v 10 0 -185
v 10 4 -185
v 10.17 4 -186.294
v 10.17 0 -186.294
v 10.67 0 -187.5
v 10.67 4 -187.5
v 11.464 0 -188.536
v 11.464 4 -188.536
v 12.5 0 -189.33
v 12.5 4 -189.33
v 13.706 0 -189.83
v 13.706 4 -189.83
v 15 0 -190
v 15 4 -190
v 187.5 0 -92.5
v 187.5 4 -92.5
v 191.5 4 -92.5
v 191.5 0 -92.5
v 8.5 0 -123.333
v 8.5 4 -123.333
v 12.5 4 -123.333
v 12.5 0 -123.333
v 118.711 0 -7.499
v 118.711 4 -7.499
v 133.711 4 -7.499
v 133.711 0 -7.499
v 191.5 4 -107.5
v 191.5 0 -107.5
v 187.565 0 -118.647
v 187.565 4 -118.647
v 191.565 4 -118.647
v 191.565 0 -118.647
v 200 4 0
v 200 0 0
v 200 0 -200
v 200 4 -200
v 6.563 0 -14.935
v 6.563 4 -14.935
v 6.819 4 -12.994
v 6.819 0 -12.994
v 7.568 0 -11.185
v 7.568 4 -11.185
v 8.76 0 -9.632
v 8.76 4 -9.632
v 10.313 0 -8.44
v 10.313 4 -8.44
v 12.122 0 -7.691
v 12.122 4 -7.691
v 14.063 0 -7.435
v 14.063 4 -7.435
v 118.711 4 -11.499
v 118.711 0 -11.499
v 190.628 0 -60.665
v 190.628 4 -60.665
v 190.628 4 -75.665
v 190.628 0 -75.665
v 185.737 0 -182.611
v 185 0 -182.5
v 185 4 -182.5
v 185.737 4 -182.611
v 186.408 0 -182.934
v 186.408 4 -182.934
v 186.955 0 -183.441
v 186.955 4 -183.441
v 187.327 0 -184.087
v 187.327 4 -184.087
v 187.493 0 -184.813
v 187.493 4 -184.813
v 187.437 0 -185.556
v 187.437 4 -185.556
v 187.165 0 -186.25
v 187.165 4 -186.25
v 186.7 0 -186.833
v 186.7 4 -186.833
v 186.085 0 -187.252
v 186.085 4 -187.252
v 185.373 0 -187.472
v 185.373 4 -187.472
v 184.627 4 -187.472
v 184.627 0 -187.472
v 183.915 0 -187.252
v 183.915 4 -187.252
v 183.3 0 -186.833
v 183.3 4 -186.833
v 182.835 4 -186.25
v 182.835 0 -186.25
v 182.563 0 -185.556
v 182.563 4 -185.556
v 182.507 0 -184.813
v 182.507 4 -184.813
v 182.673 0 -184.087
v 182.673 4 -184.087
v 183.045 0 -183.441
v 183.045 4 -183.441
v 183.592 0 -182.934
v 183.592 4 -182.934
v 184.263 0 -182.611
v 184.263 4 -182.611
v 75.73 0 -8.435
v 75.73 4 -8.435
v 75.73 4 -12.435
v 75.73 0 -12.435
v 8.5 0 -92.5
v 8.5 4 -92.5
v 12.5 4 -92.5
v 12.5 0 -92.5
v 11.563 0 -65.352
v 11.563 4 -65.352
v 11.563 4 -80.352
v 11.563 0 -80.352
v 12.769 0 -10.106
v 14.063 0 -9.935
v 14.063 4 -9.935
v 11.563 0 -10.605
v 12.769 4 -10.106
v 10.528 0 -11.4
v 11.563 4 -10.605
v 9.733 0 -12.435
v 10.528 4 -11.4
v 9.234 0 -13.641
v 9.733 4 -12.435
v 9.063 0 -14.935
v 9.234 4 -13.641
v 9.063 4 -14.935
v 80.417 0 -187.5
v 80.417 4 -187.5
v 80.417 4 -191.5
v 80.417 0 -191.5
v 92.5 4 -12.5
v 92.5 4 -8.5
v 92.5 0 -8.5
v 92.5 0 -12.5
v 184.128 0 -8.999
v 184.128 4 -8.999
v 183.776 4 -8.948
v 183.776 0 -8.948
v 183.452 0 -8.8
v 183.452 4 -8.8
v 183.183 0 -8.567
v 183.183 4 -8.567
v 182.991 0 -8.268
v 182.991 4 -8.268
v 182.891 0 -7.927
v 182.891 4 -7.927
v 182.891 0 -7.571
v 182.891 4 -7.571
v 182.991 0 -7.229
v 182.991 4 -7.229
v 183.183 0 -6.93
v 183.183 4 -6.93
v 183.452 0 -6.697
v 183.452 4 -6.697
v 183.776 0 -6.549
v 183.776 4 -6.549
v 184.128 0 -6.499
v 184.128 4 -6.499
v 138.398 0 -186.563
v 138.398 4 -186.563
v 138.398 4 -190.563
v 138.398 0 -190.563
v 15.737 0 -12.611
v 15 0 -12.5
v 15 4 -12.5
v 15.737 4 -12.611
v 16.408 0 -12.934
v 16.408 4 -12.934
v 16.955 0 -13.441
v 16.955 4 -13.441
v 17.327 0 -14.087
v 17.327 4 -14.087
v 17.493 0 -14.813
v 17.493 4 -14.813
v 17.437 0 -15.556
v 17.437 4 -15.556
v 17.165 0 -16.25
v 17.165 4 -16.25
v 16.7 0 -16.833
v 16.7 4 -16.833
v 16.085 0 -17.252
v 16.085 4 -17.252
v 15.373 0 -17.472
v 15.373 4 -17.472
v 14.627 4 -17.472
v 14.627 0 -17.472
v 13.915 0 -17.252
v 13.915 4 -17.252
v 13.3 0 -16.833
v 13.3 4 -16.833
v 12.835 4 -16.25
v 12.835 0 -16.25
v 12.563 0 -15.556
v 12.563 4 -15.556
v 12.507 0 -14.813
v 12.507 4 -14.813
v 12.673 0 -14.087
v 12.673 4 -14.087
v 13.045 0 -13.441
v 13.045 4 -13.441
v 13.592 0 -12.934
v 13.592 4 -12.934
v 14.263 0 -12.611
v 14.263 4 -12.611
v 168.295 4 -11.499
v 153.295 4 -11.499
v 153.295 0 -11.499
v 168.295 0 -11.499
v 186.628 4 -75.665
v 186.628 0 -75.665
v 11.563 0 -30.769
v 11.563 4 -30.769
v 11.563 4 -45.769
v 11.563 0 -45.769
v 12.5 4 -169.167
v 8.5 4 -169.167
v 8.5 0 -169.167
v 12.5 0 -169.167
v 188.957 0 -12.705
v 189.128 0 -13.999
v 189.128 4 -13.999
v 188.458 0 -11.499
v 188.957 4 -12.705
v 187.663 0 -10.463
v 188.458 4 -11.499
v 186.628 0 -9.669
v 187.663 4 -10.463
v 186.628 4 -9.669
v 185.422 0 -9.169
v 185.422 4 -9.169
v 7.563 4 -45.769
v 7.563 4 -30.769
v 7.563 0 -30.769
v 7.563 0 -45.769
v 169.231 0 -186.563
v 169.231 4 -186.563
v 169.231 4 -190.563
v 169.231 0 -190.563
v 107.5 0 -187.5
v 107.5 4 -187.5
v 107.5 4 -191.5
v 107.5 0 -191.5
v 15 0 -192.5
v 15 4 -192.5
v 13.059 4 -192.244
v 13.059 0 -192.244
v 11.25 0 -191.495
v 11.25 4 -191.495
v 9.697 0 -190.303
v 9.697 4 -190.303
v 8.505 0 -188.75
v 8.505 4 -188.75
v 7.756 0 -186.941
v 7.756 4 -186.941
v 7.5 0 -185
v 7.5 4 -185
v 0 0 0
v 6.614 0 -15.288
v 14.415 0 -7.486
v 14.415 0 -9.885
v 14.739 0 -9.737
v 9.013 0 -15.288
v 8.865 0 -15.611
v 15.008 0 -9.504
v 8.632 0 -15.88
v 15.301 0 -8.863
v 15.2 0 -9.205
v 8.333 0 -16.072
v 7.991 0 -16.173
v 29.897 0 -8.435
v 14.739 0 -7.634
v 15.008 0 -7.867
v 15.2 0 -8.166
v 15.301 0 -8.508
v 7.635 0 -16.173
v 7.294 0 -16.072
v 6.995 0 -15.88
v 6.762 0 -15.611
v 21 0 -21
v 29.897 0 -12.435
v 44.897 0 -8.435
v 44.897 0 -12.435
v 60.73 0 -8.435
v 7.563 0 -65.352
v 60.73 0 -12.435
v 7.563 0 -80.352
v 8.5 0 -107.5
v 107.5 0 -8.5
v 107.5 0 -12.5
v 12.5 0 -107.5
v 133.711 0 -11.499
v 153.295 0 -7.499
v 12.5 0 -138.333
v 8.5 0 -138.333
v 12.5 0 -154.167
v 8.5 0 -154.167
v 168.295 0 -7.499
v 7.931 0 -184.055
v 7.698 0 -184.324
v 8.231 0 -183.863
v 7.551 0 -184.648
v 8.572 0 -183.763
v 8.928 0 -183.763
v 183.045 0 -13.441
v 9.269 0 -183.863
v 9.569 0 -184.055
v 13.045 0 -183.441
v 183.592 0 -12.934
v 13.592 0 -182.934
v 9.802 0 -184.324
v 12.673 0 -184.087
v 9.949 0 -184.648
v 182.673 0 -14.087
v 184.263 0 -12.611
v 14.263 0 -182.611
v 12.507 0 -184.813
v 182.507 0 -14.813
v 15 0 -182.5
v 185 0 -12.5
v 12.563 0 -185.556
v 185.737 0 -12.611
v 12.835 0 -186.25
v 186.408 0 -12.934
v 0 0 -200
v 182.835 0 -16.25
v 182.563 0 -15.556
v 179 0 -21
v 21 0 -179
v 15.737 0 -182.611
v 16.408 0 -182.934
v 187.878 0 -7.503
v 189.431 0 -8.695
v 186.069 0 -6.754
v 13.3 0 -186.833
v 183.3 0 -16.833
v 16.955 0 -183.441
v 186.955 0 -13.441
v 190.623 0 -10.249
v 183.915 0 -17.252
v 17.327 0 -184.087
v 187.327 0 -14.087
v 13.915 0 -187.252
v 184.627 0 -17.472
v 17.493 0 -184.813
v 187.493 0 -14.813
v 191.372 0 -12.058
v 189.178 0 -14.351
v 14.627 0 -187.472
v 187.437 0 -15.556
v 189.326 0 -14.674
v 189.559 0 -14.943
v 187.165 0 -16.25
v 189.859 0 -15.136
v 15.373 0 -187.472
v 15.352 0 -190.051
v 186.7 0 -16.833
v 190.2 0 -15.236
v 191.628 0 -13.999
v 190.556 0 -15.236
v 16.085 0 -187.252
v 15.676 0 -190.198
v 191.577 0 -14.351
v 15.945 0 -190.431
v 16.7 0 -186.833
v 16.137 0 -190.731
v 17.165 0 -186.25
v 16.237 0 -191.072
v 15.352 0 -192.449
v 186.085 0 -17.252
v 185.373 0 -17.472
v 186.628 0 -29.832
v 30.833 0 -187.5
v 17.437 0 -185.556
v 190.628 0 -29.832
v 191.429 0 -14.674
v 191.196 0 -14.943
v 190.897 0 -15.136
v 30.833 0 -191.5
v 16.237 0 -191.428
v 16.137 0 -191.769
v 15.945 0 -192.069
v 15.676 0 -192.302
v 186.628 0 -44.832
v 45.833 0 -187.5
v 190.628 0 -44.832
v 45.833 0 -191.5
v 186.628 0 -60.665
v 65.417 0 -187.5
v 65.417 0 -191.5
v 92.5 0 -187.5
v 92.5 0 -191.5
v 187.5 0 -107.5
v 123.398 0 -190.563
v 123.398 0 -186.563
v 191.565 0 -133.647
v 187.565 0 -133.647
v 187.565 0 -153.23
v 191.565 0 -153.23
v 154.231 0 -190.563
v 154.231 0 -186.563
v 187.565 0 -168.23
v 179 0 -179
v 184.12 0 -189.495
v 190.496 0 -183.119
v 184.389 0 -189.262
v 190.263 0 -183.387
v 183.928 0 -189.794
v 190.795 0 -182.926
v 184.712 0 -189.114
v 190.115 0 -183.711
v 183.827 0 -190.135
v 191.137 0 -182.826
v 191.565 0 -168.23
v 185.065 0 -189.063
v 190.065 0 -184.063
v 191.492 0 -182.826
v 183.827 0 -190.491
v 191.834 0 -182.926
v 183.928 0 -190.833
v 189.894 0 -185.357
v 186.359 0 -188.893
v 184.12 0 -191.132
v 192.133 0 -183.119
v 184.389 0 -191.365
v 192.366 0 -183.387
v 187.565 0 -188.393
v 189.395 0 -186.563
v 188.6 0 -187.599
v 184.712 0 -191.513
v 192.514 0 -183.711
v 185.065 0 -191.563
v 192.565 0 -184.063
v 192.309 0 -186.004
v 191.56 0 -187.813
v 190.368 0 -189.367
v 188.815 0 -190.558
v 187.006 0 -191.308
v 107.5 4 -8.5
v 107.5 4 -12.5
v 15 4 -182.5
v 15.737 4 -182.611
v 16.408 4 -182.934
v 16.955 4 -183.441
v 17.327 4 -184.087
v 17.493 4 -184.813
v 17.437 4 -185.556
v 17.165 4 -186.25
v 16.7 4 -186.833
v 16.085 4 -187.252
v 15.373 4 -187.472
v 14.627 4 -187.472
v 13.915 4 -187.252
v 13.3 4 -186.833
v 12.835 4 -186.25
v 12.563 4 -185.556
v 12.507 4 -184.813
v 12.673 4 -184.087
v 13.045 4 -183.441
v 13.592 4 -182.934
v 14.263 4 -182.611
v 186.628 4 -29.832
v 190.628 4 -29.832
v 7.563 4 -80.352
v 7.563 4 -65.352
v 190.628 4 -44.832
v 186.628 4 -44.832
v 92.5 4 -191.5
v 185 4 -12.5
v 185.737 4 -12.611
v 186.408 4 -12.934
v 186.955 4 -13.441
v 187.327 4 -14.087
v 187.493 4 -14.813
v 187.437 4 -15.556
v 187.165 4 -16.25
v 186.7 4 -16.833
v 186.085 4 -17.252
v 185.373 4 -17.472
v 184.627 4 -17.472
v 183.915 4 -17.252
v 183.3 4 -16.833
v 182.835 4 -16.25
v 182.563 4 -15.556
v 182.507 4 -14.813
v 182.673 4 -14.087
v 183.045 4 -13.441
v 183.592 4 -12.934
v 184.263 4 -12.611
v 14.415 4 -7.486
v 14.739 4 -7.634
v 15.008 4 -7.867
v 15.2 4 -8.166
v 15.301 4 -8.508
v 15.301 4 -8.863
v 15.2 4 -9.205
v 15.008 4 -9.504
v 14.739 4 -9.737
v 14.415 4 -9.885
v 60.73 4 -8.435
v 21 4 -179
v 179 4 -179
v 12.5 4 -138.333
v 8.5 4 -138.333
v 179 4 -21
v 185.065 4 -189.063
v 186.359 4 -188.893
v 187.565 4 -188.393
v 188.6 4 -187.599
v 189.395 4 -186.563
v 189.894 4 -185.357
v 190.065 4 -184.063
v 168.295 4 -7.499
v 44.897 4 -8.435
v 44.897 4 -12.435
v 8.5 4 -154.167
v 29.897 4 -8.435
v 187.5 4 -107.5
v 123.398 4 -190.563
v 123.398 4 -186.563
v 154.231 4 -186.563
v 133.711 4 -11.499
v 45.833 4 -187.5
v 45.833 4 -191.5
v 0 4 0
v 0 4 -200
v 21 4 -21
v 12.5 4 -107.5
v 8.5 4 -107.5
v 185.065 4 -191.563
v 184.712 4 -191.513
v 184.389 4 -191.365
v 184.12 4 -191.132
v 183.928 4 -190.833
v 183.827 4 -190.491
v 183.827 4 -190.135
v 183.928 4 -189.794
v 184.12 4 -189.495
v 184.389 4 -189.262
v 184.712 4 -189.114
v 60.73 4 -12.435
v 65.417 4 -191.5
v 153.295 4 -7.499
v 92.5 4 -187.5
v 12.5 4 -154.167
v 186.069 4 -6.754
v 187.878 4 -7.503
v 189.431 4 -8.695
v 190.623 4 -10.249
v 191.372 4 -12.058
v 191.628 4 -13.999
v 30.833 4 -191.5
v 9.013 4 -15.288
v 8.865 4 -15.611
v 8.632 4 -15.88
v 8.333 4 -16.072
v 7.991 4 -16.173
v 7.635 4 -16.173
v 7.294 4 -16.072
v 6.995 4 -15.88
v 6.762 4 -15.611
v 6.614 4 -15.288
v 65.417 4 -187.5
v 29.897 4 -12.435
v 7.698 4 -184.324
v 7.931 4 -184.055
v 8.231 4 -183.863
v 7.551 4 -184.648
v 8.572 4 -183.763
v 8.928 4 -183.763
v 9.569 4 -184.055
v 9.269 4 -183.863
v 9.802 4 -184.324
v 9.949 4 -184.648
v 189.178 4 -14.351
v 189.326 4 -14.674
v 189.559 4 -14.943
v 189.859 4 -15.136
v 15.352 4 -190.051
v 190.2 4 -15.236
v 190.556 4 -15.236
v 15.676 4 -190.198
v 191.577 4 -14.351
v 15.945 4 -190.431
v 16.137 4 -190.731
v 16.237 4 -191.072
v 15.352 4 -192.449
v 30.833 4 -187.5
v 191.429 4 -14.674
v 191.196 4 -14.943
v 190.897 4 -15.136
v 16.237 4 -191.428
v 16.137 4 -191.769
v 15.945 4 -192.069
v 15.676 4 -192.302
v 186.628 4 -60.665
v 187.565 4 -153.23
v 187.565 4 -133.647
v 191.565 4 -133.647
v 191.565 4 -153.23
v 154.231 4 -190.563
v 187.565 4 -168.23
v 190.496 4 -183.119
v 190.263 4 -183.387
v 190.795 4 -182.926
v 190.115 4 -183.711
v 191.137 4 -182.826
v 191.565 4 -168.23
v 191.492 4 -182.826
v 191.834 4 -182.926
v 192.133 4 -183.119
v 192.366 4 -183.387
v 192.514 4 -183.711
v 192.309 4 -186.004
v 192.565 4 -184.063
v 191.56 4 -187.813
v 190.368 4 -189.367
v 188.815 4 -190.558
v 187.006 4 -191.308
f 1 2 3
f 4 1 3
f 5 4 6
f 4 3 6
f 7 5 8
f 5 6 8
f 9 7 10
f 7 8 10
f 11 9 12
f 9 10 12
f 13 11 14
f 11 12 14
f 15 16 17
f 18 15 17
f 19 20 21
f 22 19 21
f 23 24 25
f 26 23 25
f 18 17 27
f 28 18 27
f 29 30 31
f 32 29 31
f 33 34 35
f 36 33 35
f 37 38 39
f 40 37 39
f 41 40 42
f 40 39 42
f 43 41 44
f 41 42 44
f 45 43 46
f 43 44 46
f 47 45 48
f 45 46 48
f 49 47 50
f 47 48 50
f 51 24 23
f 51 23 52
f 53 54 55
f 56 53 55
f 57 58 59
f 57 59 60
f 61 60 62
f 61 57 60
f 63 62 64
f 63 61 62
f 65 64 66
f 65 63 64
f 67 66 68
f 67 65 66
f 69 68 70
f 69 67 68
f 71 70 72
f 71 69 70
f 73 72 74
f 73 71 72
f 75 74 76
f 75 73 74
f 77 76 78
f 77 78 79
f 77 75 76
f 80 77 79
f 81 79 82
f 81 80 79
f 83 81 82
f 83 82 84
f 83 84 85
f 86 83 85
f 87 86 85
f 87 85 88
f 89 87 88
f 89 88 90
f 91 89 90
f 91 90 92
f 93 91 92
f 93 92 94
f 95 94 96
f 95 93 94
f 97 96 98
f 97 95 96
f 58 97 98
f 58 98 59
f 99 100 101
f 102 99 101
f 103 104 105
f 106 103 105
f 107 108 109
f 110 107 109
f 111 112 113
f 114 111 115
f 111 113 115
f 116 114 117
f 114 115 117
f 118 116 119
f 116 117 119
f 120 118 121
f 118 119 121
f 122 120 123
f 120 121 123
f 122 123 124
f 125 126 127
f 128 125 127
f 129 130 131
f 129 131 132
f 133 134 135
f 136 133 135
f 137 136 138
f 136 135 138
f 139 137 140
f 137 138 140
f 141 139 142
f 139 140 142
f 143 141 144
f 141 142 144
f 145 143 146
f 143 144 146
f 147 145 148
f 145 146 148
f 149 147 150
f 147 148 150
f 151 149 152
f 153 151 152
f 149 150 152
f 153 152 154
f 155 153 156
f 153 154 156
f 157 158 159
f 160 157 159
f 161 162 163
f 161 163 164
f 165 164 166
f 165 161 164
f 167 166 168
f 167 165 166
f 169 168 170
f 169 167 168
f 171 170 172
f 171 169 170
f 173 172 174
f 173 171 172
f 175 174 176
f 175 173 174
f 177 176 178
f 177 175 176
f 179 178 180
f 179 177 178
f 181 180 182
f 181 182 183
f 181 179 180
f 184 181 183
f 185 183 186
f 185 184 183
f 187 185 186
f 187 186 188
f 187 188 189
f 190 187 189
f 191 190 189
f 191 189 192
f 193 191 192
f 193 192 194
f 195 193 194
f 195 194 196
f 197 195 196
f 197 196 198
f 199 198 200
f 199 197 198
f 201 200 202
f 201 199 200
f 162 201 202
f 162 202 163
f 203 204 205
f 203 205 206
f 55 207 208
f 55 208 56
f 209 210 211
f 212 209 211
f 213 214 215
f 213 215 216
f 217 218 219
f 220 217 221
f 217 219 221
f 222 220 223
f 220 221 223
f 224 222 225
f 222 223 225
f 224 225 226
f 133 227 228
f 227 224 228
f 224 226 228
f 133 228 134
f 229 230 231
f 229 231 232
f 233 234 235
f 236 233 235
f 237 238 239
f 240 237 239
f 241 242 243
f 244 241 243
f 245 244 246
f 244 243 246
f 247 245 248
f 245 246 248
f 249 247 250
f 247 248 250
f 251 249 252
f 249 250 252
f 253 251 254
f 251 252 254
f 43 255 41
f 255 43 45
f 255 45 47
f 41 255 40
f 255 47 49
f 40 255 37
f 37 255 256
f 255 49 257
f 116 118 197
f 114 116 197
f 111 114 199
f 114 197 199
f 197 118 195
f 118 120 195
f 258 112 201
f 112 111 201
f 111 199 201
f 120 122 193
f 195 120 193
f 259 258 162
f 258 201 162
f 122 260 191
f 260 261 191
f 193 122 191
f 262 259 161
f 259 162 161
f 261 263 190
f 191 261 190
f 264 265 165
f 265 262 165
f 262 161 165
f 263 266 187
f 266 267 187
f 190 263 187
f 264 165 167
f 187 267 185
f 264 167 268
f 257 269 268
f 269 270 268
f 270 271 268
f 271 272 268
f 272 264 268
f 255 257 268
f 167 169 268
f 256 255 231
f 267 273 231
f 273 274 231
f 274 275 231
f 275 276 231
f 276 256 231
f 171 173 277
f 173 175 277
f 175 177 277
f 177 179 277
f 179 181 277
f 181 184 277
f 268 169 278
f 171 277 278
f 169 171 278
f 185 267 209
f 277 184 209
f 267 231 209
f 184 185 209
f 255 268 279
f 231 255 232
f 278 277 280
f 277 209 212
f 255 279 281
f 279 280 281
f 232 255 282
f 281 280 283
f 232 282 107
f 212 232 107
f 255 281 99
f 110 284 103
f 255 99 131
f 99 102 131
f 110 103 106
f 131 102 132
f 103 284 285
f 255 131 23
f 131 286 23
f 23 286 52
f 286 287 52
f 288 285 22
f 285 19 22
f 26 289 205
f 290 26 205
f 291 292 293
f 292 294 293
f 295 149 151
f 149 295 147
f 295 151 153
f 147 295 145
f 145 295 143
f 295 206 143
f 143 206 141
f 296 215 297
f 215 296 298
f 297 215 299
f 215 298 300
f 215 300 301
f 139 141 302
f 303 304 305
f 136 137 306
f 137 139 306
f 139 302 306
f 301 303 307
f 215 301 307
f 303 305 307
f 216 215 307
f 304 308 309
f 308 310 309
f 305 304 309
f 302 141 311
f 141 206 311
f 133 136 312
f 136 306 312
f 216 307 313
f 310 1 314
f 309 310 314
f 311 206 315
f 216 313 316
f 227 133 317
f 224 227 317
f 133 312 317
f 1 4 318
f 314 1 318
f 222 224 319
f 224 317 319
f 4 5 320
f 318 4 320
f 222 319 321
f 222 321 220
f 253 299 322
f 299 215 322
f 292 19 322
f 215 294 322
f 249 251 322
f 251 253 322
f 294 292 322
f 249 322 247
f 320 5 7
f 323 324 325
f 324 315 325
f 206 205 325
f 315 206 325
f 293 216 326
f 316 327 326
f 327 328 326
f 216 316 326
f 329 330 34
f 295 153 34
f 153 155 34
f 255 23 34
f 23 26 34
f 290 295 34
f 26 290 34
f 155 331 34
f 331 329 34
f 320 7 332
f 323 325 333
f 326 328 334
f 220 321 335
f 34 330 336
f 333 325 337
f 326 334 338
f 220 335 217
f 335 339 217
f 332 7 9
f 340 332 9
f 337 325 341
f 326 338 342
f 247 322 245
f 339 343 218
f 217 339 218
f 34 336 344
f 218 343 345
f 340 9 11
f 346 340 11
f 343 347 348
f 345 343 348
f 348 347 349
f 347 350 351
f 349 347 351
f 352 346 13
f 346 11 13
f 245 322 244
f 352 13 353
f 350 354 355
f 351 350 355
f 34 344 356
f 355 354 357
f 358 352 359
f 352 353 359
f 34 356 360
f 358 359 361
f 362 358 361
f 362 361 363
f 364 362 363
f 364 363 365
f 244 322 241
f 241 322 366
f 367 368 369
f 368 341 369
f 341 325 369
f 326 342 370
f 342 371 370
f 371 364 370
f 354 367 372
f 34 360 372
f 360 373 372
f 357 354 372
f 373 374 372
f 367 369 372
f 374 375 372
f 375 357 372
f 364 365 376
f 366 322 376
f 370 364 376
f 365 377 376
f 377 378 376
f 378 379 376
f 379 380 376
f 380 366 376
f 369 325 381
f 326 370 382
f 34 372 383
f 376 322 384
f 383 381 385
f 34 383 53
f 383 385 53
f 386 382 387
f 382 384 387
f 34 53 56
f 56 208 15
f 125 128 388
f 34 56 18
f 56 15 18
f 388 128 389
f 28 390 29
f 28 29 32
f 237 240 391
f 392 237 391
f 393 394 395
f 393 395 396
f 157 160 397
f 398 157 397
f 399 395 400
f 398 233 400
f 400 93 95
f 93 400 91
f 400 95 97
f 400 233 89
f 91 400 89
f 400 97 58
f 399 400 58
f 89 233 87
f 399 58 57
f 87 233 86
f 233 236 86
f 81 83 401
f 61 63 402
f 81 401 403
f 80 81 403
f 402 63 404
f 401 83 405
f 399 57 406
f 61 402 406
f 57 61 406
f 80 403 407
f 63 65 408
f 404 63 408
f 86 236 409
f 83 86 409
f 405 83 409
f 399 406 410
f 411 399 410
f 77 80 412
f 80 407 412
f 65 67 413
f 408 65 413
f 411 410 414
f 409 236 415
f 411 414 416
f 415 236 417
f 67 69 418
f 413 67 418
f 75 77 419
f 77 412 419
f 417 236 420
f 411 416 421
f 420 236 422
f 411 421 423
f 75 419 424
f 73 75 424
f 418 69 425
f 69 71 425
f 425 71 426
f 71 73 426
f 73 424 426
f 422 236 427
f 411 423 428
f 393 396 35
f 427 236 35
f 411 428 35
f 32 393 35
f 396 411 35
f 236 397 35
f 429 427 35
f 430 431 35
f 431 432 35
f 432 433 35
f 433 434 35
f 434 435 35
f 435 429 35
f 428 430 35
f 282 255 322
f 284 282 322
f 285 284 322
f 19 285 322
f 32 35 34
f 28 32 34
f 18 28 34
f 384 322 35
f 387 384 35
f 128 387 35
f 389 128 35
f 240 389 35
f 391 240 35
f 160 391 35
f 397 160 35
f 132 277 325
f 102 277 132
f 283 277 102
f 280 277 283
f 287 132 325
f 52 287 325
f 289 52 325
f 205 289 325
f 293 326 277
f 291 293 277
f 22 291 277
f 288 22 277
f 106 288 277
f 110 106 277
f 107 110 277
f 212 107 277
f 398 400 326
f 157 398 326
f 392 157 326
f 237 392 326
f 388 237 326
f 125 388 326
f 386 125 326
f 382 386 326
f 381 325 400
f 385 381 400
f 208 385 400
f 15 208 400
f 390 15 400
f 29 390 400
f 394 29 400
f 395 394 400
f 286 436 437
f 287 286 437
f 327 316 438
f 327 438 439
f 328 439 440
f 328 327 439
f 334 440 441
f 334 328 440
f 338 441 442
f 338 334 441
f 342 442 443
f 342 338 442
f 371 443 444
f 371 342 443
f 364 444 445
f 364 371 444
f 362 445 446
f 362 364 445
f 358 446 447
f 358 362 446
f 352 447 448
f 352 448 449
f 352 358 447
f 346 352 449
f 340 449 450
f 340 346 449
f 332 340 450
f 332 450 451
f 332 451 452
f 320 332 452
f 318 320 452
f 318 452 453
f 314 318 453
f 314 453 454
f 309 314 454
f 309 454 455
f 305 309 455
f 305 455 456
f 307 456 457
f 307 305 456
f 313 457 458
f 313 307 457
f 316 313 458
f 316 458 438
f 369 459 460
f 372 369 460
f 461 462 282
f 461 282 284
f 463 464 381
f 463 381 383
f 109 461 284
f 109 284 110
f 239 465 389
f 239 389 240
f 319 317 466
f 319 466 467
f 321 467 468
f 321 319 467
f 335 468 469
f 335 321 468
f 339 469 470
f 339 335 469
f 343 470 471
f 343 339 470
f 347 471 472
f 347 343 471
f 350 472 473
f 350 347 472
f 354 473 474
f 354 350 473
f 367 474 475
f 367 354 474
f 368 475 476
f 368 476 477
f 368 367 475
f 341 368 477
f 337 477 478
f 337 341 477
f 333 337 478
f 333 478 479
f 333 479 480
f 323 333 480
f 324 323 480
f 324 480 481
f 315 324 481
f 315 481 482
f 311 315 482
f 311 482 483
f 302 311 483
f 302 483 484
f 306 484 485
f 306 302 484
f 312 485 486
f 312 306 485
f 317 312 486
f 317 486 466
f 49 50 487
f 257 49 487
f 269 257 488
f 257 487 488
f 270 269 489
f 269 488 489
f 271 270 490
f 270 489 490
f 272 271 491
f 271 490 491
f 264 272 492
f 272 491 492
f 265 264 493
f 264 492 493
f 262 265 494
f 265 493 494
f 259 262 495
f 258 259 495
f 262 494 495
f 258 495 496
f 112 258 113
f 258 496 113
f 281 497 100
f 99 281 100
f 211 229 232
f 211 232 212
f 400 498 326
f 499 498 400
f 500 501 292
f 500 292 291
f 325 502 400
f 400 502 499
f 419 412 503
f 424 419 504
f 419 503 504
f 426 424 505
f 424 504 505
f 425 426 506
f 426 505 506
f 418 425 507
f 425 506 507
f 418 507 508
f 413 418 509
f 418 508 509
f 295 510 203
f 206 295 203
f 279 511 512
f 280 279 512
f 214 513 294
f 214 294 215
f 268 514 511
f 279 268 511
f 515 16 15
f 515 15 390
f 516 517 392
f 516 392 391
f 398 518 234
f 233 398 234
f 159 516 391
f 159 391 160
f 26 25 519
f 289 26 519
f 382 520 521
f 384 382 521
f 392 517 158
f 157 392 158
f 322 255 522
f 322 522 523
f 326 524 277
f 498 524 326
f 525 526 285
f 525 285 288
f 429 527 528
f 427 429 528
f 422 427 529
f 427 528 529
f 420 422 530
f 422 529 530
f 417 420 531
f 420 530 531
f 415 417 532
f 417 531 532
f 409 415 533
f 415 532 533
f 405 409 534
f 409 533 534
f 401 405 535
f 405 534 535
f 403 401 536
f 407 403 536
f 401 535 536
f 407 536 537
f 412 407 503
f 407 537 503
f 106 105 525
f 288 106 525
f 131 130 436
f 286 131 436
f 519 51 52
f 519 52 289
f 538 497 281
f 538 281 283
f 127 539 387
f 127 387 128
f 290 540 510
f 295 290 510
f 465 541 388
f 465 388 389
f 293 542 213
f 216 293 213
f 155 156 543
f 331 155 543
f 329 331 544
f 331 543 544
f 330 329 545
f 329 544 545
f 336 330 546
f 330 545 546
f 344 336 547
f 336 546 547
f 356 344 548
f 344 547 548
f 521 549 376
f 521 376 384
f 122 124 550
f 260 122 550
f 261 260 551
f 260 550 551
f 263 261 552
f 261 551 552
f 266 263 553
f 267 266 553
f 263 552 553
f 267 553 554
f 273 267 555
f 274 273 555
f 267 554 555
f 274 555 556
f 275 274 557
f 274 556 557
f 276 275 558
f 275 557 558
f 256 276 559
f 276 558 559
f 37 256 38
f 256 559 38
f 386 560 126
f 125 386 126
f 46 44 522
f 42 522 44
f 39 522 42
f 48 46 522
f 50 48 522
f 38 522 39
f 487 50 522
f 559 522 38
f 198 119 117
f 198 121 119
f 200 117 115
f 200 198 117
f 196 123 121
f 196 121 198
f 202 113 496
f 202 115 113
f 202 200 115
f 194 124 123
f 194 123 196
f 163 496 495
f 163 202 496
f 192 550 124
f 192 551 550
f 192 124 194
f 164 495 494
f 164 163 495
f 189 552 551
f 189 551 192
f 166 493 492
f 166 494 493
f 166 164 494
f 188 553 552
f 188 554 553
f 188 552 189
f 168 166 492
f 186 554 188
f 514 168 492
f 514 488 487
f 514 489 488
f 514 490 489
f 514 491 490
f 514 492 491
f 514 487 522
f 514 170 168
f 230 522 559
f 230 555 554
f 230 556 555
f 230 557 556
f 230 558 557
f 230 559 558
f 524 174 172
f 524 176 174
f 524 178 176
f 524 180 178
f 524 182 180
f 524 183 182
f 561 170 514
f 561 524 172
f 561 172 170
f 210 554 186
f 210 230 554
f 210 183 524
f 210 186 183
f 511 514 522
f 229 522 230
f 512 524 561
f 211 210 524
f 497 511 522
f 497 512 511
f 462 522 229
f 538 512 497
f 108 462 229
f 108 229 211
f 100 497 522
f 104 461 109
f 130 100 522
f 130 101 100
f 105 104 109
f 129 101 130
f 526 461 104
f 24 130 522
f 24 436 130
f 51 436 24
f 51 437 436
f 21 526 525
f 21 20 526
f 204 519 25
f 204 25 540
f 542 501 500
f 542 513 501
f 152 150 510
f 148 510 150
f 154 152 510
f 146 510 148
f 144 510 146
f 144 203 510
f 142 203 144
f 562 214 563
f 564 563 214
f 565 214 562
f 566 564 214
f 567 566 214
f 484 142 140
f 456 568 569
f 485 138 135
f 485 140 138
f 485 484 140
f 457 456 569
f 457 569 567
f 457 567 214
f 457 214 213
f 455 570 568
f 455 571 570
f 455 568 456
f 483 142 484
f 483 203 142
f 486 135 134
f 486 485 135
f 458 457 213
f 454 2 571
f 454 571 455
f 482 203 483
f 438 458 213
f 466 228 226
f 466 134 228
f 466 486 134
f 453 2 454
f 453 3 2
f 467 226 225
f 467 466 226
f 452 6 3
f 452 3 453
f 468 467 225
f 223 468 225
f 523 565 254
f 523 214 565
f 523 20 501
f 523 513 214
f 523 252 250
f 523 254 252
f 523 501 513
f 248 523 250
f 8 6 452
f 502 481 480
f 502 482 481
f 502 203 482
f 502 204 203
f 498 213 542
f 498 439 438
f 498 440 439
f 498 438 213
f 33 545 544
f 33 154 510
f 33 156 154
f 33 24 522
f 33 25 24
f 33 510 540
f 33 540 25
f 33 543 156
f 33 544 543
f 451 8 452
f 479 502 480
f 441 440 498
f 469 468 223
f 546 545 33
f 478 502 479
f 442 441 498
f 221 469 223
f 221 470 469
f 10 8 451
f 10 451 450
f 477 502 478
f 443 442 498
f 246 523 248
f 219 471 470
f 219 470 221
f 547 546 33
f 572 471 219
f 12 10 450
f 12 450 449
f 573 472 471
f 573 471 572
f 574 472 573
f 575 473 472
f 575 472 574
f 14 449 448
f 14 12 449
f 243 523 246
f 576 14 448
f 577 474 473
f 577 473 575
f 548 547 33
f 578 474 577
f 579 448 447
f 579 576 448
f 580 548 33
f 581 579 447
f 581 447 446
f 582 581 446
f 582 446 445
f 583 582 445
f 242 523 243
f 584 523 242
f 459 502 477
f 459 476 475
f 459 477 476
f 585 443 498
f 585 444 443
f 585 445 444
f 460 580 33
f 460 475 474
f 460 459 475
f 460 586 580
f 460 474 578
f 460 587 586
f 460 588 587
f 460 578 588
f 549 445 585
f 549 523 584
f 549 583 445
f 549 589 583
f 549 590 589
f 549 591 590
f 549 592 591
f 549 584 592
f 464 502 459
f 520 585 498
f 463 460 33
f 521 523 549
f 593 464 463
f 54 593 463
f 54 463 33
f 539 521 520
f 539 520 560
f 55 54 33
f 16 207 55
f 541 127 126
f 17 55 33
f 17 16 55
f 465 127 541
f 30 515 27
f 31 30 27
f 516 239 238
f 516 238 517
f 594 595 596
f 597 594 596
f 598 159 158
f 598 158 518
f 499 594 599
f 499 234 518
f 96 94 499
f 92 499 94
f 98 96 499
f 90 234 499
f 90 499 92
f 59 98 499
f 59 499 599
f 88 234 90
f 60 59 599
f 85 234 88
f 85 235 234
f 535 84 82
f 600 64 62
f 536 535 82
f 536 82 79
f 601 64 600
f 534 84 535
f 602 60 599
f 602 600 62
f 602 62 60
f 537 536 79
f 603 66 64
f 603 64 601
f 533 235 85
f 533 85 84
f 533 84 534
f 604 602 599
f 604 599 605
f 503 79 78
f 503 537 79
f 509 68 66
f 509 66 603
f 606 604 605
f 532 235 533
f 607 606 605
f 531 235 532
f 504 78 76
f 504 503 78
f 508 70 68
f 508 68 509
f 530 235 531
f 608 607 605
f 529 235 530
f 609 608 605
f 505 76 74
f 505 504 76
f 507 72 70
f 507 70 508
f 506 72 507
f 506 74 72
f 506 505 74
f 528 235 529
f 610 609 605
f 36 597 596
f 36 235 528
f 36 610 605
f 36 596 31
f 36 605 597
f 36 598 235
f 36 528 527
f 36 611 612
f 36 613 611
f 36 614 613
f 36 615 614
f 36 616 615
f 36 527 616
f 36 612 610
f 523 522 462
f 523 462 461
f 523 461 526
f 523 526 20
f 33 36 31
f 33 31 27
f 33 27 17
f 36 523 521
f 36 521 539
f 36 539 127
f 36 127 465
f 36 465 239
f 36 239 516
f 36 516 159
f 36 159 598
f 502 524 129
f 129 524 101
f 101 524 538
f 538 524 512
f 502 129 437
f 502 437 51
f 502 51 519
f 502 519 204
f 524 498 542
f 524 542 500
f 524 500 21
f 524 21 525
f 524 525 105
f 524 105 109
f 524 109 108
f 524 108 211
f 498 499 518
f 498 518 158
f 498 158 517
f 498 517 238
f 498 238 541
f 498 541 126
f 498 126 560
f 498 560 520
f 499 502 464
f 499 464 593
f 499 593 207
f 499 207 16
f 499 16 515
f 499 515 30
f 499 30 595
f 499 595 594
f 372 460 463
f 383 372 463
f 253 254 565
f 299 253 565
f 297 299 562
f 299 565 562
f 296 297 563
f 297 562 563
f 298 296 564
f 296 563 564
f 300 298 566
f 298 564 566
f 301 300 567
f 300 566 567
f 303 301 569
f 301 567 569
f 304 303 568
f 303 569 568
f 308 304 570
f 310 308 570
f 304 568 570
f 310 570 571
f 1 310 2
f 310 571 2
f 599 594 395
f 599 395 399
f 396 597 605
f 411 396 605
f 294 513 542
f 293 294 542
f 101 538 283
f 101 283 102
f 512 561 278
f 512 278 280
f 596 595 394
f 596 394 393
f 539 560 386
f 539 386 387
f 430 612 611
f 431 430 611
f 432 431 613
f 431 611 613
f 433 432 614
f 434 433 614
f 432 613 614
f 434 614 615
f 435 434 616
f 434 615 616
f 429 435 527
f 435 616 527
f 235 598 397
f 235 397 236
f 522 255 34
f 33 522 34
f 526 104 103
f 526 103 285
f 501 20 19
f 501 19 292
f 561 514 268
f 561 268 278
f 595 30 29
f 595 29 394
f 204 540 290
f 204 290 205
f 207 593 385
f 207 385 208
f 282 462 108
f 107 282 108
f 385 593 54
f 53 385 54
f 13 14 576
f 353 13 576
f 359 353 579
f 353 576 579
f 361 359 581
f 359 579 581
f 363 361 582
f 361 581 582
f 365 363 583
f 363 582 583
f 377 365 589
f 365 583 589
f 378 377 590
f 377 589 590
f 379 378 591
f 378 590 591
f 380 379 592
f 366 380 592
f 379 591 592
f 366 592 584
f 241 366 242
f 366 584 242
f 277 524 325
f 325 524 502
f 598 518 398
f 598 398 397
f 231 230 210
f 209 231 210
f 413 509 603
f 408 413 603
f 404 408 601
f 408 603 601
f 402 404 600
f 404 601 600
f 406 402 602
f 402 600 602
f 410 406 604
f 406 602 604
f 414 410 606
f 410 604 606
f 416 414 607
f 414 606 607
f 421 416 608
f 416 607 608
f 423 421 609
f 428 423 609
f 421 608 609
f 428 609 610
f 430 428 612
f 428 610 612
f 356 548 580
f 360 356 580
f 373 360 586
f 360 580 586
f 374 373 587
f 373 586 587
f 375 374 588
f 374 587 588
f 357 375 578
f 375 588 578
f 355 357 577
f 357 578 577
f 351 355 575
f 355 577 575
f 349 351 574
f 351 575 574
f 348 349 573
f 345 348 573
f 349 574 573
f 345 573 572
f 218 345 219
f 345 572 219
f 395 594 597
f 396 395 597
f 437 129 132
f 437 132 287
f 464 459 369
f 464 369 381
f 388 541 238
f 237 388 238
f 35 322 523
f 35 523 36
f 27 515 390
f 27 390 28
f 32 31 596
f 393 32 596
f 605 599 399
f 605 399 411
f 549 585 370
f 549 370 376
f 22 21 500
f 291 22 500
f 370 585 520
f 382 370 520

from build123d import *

# Parameters (mm, degrees)
CROQUIS1_W              = 200
CROQUIS1_H              = 200
CROQUIS1_R              = 2.5
SALIENTE_EXTRUIR1_DEPTH = 4
CROQUIS2_W              = 158
CROQUIS2_H              = 158
CORTAR_EXTRUIR1_DEPTH   = 10
CROQUIS4_W              = 4
CROQUIS4_H              = 15
CROQUIS4_W_2            = 15
CROQUIS4_H_2            = 4
CORTAR_EXTRUIR2_DEPTH   = 10


with BuildPart() as part:
    # Croquis1 → Saliente-Extruir1 (new body)
    with BuildSketch(Plane(origin=(0, 0, 0), x_dir=(1, 0, 0), z_dir=(0, 1, 0))):
        with Locations((100, 100)):
            Rectangle(CROQUIS1_W, CROQUIS1_H)
        with Locations(Location((15, 185, 0), (0, 0, 270))):
            Circle(CROQUIS1_R, mode=Mode.SUBTRACT)
        with Locations(Location((185, 185, 0), (0, 0, 270))):
            Circle(CROQUIS1_R, mode=Mode.SUBTRACT)
        with Locations(Location((185, 15, 0), (0, 0, 270))):
            Circle(CROQUIS1_R, mode=Mode.SUBTRACT)
        with Locations(Location((15, 15, 0), (0, 0, 270))):
            Circle(CROQUIS1_R, mode=Mode.SUBTRACT)
    extrude(amount=SALIENTE_EXTRUIR1_DEPTH)

    # Croquis2 → Cortar-Extruir1 (cut)
    with BuildSketch(Plane(origin=(0, 4, 0), x_dir=(1, 0, 0), z_dir=(0, 1, 0))):
        with Locations((100, 100)):
            Rectangle(CROQUIS2_W, CROQUIS2_H)
    extrude(amount=-CORTAR_EXTRUIR1_DEPTH, mode=Mode.SUBTRACT)

    # Croquis4 → Cortar-Extruir2 (cut)
    with BuildSketch(Plane(origin=(0, 4, 0), x_dir=(1, 0, 0), z_dir=(0, 1, 0))):
        with Locations((10.5, 130.833333333)):
            Rectangle(CROQUIS4_W, CROQUIS4_H)
        with Locations((10.5, 161.666666667)):
            Rectangle(CROQUIS4_W, CROQUIS4_H)
        with Locations((38.333333333, 189.5)):
            Rectangle(CROQUIS4_W_2, CROQUIS4_H_2)
        with Locations((72.916666667, 189.5)):
            Rectangle(CROQUIS4_W_2, CROQUIS4_H_2)
        with Locations((189.564602861, 126.146591855)):
            Rectangle(CROQUIS4_W, CROQUIS4_H)
        with Locations((189.564602861, 160.729925188)):
            Rectangle(CROQUIS4_W, CROQUIS4_H)
        with Locations((130.897936194, 188.563258522)):
            Rectangle(CROQUIS4_W_2, CROQUIS4_H_2)
        with Locations((161.731269527, 188.563258522)):
            Rectangle(CROQUIS4_W_2, CROQUIS4_H_2)
        with Locations((126.211194716, 9.498655661)):
            Rectangle(CROQUIS4_W_2, CROQUIS4_H_2)
        with Locations((160.794528049, 9.498655661)):
            Rectangle(CROQUIS4_W_2, CROQUIS4_H_2)
        with Locations((188.627861382, 68.165322328)):
            Rectangle(CROQUIS4_W, CROQUIS4_H)
        with Locations((188.627861382, 37.331988994)):
            Rectangle(CROQUIS4_W, CROQUIS4_H)
        with Locations((9.563258522, 72.852063806)):
            Rectangle(CROQUIS4_W, CROQUIS4_H)
        with Locations((9.563258522, 38.268730473)):
            Rectangle(CROQUIS4_W, CROQUIS4_H)
        with Locations((68.229925188, 10.435397139)):
            Rectangle(CROQUIS4_W_2, CROQUIS4_H_2)
        with Locations((37.396591855, 10.435397139)):
            Rectangle(CROQUIS4_W_2, CROQUIS4_H_2)
        with Locations((100, 189.5)):
            Rectangle(CROQUIS4_W_2, CROQUIS4_H_2)
        with Locations((10.5, 100)):
            Rectangle(CROQUIS4_W, CROQUIS4_H)
        with Locations((189.5, 100)):
            Rectangle(CROQUIS4_W, CROQUIS4_H)
        with Locations((100, 10.5)):
            Rectangle(CROQUIS4_W_2, CROQUIS4_H_2)
        with BuildLine():
            ThreePointArc((15, 192.5), (9.696699141, 190.303300859), (7.5, 185))
            ThreePointArc((7.5, 185), (8.75, 183.75), (10, 185))
            ThreePointArc((10, 185), (11.464466094, 188.535533906), (15, 190))
            ThreePointArc((15, 190), (16.25, 191.25), (15, 192.5))
        make_face()
        with BuildLine():
            ThreePointArc((185.064602861, 191.563258522), (183.814602861, 190.313258522), (185.064602861, 189.063258522))
            ThreePointArc((185.064602861, 189.063258522), (188.600136767, 187.598792428), (190.064602861, 184.063258522))
            ThreePointArc((190.064602861, 184.063258522), (191.314602861, 182.813258522), (192.564602861, 184.063258522))
            ThreePointArc((192.564602861, 184.063258522), (190.367903719, 189.366559381), (185.064602861, 191.563258522))
        make_face()
        with BuildLine():
            ThreePointArc((191.627861382, 13.998655661), (190.377861382, 15.248655661), (189.127861382, 13.998655661))
            ThreePointArc((189.127861382, 13.998655661), (187.663395288, 10.463121755), (184.127861382, 8.998655661))
            ThreePointArc((184.127861382, 8.998655661), (182.877861382, 7.748655661), (184.127861382, 6.498655661))
            ThreePointArc((184.127861382, 6.498655661), (189.431162241, 8.695354802), (191.627861382, 13.998655661))
        make_face()
        with BuildLine():
            ThreePointArc((14.063258522, 7.435397139), (15.313258522, 8.685397139), (14.063258522, 9.935397139))
            ThreePointArc((14.063258522, 9.935397139), (10.527724616, 11.399863233), (9.063258522, 14.935397139))
            ThreePointArc((9.063258522, 14.935397139), (7.813258522, 16.185397139), (6.563258522, 14.935397139))
            ThreePointArc((6.563258522, 14.935397139), (8.759957663, 9.632096281), (14.063258522, 7.435397139))
        make_face()
    extrude(amount=-CORTAR_EXTRUIR2_DEPTH, mode=Mode.SUBTRACT)


solid = part.part
